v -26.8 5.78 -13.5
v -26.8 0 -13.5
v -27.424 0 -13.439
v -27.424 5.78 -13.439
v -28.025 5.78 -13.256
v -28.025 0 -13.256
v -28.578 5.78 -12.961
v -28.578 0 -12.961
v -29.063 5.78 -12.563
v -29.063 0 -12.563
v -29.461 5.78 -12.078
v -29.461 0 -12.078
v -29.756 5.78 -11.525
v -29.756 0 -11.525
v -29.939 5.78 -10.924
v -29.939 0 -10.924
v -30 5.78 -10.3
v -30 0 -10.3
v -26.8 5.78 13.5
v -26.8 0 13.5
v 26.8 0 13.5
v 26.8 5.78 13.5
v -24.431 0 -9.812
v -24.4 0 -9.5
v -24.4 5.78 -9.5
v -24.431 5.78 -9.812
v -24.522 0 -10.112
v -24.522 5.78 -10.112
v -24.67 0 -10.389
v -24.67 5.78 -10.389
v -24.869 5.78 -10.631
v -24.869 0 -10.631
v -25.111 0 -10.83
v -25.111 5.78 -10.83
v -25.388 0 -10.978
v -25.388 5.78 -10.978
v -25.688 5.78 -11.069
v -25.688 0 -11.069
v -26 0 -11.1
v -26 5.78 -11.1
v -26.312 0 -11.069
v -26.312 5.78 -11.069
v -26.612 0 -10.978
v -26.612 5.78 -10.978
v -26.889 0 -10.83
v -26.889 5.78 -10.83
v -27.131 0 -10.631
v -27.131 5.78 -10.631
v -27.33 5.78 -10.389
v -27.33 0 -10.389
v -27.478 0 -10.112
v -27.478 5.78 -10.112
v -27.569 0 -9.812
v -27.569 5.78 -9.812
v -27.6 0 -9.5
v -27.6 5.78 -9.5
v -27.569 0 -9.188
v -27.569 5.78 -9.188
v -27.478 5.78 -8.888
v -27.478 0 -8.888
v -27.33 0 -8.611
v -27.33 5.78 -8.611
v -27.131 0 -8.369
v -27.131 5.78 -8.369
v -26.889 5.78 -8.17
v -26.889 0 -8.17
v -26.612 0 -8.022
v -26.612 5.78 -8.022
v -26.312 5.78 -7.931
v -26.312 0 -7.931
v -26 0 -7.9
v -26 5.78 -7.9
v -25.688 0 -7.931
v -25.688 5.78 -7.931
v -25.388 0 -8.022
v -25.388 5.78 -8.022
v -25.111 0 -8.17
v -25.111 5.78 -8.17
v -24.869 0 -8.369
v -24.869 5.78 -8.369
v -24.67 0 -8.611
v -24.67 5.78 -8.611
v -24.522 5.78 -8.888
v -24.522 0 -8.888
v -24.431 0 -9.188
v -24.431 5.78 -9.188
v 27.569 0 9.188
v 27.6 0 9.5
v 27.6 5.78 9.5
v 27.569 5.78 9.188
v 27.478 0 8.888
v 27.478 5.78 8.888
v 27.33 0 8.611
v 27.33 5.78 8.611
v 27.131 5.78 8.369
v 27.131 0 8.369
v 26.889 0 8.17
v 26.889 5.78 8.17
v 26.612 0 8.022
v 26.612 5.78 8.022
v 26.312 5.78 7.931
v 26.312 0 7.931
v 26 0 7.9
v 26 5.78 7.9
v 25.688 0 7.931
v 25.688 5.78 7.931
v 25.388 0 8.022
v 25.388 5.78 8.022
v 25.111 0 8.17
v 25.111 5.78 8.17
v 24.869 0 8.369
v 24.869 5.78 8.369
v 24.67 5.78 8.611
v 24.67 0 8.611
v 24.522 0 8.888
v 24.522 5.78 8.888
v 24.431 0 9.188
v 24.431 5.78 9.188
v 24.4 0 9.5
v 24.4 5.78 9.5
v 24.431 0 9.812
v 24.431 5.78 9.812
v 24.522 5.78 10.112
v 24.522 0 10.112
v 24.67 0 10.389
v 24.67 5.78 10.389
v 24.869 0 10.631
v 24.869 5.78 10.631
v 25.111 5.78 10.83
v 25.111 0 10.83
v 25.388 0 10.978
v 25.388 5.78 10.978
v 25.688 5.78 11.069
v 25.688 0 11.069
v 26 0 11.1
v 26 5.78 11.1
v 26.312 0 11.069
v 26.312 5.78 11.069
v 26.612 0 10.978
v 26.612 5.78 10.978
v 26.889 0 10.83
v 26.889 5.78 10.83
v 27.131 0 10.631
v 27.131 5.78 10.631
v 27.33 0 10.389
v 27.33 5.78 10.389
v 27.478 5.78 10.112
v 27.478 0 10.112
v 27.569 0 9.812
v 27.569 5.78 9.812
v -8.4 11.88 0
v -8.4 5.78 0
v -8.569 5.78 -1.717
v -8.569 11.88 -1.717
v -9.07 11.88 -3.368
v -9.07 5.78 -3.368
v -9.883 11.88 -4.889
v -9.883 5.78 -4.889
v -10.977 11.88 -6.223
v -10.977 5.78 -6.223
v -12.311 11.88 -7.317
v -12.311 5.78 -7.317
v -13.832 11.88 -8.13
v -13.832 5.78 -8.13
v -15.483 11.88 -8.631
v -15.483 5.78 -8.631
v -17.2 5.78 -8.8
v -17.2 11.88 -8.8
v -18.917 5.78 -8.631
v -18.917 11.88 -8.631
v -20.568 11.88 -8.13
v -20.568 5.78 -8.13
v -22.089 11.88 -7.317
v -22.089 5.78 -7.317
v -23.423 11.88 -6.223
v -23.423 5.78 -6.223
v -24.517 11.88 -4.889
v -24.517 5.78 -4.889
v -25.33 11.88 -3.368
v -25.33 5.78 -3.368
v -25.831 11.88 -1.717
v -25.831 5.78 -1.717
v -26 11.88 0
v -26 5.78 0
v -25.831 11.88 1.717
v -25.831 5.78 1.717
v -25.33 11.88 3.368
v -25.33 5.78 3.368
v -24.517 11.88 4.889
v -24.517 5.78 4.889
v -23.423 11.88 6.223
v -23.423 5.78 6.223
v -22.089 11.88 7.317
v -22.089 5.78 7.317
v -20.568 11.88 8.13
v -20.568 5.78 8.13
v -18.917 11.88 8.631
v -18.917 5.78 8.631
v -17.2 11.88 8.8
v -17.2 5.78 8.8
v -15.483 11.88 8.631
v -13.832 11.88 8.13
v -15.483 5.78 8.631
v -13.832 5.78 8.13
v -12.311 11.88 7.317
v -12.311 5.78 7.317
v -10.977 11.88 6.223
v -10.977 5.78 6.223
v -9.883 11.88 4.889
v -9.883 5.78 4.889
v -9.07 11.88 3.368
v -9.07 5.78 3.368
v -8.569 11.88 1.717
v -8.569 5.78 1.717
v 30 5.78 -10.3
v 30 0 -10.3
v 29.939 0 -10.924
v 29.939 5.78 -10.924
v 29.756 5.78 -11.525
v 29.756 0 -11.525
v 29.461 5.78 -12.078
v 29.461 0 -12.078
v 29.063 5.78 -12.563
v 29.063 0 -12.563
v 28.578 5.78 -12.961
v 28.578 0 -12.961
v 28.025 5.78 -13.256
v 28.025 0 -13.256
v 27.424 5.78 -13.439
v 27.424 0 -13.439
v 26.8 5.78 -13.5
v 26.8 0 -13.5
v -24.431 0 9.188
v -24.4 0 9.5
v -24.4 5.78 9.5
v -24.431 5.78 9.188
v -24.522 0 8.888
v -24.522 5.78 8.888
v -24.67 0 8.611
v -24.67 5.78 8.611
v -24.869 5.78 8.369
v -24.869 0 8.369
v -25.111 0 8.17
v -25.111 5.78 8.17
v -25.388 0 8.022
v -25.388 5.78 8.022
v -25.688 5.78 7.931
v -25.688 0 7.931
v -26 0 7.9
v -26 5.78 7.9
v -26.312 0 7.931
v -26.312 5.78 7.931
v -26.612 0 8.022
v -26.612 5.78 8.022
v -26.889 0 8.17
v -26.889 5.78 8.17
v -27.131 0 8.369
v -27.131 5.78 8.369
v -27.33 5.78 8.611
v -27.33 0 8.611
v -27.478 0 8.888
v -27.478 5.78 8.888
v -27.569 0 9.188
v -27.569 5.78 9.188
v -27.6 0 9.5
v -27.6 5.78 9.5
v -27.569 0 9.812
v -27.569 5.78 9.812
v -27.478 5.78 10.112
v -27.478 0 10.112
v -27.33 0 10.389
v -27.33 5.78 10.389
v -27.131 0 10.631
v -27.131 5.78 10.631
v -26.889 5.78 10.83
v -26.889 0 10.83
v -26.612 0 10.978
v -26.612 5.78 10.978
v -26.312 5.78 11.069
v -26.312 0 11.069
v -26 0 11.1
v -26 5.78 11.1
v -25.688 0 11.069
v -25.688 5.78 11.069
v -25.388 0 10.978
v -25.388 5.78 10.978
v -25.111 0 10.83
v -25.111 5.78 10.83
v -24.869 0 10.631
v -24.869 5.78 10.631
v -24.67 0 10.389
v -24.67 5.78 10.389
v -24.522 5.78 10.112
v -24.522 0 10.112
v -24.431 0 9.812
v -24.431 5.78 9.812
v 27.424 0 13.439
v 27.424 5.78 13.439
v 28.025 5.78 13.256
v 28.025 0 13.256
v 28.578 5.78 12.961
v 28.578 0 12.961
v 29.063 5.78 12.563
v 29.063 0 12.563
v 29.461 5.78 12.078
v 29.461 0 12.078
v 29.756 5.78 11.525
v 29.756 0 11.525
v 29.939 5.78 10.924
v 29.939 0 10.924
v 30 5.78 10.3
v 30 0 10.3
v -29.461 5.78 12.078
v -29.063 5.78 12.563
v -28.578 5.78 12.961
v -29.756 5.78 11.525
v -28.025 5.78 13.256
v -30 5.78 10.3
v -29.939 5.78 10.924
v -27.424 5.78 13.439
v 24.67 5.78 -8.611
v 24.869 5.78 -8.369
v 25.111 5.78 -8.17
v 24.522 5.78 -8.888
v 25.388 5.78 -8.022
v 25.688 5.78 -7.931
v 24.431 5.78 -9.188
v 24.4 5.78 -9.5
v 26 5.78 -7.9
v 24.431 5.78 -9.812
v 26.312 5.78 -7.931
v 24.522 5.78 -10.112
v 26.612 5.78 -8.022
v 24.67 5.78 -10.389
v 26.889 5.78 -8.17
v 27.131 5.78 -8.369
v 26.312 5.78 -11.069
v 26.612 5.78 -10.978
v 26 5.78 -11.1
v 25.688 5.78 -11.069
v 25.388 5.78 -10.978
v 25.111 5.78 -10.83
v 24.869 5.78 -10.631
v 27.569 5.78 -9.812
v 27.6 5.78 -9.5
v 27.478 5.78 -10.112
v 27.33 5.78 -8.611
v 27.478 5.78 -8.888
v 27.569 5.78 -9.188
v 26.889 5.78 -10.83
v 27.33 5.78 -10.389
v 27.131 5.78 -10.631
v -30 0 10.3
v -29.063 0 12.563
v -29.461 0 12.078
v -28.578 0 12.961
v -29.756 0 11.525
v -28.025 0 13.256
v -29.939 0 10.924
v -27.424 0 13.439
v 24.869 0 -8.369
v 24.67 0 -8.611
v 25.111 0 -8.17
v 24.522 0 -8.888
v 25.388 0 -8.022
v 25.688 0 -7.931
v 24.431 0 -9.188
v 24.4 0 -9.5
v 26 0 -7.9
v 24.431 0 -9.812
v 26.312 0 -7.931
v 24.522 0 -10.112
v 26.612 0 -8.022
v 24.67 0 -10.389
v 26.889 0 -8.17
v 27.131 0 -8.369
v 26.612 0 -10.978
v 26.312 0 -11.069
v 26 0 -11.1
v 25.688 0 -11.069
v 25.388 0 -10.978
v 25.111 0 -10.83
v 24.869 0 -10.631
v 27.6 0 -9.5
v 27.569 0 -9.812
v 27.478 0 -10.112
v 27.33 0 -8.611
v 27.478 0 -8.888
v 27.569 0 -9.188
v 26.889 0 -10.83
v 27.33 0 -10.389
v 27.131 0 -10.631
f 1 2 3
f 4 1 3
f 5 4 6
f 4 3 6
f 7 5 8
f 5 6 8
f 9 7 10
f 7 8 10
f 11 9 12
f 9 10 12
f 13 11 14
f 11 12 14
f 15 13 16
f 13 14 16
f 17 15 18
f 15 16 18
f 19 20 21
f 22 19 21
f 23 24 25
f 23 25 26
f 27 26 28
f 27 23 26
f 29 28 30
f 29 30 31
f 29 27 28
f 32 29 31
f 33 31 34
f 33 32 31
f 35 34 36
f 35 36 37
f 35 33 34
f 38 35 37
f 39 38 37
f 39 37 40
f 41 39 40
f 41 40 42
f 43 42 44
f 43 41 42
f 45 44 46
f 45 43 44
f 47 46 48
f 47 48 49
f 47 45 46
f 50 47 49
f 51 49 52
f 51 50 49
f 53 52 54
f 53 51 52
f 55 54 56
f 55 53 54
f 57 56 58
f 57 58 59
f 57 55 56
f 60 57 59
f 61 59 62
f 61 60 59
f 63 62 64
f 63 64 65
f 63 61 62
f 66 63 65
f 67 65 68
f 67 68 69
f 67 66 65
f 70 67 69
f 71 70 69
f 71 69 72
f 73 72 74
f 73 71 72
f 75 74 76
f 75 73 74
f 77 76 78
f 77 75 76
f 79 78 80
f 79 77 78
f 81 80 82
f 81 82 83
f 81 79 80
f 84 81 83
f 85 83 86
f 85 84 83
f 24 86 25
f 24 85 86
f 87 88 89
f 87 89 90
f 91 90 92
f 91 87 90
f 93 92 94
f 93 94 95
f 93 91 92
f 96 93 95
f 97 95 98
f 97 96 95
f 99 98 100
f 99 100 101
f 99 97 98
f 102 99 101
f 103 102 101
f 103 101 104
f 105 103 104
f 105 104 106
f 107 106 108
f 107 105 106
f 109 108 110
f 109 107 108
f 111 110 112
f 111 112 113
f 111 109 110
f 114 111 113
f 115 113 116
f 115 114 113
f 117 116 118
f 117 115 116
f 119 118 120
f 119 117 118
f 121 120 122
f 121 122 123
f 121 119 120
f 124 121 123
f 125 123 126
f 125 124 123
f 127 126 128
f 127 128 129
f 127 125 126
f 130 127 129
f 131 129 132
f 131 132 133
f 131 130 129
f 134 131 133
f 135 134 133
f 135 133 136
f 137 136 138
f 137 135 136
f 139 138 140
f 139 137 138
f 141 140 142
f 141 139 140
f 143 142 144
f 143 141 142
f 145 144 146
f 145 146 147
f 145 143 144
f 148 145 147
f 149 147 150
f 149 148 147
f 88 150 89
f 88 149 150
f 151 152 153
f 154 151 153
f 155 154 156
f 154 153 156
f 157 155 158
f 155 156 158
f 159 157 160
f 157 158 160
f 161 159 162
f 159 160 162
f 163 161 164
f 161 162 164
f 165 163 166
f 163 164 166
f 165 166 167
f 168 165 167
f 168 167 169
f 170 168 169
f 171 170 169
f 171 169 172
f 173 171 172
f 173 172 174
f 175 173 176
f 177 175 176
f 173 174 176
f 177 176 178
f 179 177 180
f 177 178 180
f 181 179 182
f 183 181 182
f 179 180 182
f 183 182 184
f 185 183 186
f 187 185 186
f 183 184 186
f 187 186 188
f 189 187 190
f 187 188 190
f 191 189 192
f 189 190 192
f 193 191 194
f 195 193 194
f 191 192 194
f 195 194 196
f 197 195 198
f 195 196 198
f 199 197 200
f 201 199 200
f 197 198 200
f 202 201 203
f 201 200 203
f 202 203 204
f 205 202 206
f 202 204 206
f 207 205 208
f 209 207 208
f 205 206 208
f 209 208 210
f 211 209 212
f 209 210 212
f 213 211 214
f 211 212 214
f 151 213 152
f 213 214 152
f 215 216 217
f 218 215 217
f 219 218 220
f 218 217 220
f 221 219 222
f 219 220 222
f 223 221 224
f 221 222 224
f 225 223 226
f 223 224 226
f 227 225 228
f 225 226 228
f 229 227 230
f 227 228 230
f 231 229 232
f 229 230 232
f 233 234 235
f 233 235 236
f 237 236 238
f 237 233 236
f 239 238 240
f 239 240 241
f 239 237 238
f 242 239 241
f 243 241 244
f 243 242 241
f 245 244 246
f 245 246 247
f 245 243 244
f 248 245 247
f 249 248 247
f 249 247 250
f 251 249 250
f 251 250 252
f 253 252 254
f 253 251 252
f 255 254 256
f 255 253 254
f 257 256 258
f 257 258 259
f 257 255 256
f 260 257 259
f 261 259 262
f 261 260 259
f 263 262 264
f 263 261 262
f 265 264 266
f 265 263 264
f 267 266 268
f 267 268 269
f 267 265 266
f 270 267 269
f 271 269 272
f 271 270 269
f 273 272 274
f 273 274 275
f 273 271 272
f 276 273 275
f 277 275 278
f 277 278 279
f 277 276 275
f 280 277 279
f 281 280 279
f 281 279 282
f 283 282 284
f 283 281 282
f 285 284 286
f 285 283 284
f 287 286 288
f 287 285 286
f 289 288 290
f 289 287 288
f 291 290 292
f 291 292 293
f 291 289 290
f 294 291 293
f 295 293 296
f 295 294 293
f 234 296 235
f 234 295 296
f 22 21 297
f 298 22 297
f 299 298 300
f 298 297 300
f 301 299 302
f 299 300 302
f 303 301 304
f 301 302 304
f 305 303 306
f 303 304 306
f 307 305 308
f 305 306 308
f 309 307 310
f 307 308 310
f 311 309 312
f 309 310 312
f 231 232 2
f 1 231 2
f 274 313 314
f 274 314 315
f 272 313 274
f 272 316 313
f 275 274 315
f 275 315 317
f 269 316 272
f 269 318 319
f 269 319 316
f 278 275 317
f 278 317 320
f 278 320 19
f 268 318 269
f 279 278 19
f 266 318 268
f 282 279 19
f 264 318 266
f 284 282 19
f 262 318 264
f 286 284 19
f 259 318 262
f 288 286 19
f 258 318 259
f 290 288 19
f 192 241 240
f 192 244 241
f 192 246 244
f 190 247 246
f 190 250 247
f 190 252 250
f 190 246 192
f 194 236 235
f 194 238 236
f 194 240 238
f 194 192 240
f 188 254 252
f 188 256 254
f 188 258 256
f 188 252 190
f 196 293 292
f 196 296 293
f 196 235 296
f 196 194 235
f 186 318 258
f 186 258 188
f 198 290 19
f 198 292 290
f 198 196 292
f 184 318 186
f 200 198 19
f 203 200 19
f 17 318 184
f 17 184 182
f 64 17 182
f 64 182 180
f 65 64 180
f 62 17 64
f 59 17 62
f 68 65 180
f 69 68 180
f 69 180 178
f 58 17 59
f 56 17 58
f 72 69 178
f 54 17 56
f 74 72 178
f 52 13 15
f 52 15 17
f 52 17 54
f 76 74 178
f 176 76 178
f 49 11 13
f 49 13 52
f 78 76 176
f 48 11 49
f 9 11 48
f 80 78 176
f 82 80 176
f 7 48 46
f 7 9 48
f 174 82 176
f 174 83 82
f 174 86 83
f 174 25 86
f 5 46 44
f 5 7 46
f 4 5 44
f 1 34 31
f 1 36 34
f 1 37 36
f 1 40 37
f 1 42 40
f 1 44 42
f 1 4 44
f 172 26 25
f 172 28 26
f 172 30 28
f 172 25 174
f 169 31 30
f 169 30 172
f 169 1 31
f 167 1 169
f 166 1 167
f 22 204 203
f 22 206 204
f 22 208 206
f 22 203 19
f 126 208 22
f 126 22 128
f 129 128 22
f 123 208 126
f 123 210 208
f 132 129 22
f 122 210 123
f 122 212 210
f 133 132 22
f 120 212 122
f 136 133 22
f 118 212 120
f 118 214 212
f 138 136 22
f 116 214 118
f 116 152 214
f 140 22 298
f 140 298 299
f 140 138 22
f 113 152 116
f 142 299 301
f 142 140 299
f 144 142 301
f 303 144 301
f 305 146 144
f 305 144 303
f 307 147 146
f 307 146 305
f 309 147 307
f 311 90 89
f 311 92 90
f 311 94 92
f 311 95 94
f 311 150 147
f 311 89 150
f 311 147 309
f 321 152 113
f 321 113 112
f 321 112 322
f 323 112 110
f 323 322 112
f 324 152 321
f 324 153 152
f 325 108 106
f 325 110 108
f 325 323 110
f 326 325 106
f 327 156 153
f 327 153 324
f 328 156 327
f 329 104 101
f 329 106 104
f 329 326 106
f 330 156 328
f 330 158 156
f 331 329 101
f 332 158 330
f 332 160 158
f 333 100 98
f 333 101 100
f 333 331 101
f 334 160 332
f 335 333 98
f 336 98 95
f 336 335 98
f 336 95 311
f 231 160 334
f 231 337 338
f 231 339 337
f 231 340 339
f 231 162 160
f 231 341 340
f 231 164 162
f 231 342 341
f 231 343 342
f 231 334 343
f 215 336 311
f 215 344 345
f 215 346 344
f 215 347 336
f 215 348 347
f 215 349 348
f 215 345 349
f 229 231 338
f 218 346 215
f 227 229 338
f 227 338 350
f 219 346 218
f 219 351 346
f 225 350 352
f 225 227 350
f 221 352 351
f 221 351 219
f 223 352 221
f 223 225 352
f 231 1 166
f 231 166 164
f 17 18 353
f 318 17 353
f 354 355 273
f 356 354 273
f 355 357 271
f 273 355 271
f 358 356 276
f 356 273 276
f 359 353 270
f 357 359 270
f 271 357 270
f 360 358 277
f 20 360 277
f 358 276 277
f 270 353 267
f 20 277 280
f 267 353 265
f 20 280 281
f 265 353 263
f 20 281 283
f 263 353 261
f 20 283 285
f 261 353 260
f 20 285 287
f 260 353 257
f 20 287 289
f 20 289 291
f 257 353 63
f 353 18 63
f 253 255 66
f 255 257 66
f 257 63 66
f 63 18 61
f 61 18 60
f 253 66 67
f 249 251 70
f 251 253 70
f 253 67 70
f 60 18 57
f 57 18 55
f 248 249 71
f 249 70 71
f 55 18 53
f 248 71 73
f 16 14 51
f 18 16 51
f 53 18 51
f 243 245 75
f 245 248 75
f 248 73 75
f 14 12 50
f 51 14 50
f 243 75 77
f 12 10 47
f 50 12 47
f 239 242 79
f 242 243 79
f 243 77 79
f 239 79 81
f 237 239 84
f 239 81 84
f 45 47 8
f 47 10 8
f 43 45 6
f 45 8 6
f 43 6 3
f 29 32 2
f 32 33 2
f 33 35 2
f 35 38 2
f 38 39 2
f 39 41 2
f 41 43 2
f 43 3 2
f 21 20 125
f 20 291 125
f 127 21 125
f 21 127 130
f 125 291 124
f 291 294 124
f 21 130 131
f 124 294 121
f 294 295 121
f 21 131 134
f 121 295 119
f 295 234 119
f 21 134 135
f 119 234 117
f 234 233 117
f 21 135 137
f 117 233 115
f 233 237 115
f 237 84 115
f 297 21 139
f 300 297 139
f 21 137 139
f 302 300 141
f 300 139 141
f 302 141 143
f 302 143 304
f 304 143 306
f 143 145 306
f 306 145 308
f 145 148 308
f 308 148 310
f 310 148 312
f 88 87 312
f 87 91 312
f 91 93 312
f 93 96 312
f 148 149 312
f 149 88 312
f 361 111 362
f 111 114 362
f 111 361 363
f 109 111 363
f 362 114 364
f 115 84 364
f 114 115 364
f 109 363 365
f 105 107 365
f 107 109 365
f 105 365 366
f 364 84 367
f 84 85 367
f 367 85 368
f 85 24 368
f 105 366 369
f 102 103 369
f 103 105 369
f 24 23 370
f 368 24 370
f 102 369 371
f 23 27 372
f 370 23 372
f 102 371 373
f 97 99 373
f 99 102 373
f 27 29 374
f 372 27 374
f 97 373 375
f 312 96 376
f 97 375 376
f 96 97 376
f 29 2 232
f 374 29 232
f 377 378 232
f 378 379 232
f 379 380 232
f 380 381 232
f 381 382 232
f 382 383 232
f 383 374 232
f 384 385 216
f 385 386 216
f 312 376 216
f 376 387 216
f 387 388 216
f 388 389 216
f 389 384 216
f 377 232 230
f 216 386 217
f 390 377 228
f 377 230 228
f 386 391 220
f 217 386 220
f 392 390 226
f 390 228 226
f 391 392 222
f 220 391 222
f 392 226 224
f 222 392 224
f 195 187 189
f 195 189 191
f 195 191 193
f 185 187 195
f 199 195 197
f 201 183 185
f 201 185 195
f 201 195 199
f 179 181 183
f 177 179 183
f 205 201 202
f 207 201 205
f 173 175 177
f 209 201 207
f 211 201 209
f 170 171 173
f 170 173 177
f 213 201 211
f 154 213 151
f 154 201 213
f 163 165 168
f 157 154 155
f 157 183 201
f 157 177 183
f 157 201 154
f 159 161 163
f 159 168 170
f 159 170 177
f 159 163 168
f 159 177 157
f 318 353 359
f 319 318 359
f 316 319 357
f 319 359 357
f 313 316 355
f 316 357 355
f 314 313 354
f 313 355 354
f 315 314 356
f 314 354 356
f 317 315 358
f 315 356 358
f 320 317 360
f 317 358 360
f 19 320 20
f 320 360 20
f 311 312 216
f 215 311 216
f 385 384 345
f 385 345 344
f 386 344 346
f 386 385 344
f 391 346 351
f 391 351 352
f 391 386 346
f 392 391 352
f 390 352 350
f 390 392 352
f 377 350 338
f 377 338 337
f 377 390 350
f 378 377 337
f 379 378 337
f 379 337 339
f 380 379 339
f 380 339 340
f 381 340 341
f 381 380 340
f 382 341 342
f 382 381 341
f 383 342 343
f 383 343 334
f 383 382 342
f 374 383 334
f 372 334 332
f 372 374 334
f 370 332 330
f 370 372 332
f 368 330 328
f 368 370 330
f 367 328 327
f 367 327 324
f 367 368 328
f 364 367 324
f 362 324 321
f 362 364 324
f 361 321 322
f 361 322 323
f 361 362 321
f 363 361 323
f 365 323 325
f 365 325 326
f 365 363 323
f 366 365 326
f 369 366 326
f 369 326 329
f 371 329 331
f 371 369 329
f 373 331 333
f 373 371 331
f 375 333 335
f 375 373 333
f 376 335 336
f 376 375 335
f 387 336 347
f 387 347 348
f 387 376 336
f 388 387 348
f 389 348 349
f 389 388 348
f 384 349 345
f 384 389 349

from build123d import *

# Parameters (mm, degrees)
SKETCH2_R           = 1.6
BOSS_EXTRUDE1_DEPTH = 5.78
SKETCH3_R           = 8.8
BOSS_EXTRUDE2_DEPTH = 6.1


with BuildPart() as part:
    # Sketch2 → Boss-Extrude1 (new body)
    with BuildSketch(Plane(origin=(0, 0, 0), x_dir=(1, 0, 0), z_dir=(0, 1, 0))):
        with BuildLine():
            Line((-26.8, -13.5), (26.8, -13.5))
            ThreePointArc((26.8, -13.5), (29.0627417, -12.5627417), (30, -10.3))
            Line((30, -10.3), (30, 10.3))
            ThreePointArc((30, 10.3), (29.0627417, 12.5627417), (26.8, 13.5))
            Line((26.8, 13.5), (-26.8, 13.5))
            ThreePointArc((-26.8, 13.5), (-29.0627417, 12.5627417), (-30, 10.3))
            Line((-30, 10.3), (-30, -10.3))
            ThreePointArc((-30, -10.3), (-29.0627417, -12.5627417), (-26.8, -13.5))
        make_face()
        with Locations((26, 9.5)):
            Circle(SKETCH2_R, mode=Mode.SUBTRACT)
        with Locations((-26, 9.5)):
            Circle(SKETCH2_R, mode=Mode.SUBTRACT)
        with Locations((-26, -9.5)):
            Circle(SKETCH2_R, mode=Mode.SUBTRACT)
        with Locations((26, -9.5)):
            Circle(SKETCH2_R, mode=Mode.SUBTRACT)
    extrude(amount=BOSS_EXTRUDE1_DEPTH)

    # Sketch3 → Boss-Extrude2 (add)
    with BuildSketch(Plane(origin=(0, 5.78, 0), x_dir=(1, 0, 0), z_dir=(0, 1, 0))):
        with Locations((-17.2, 0)):
            Circle(SKETCH3_R)
    extrude(amount=BOSS_EXTRUDE2_DEPTH)


solid = part.part
